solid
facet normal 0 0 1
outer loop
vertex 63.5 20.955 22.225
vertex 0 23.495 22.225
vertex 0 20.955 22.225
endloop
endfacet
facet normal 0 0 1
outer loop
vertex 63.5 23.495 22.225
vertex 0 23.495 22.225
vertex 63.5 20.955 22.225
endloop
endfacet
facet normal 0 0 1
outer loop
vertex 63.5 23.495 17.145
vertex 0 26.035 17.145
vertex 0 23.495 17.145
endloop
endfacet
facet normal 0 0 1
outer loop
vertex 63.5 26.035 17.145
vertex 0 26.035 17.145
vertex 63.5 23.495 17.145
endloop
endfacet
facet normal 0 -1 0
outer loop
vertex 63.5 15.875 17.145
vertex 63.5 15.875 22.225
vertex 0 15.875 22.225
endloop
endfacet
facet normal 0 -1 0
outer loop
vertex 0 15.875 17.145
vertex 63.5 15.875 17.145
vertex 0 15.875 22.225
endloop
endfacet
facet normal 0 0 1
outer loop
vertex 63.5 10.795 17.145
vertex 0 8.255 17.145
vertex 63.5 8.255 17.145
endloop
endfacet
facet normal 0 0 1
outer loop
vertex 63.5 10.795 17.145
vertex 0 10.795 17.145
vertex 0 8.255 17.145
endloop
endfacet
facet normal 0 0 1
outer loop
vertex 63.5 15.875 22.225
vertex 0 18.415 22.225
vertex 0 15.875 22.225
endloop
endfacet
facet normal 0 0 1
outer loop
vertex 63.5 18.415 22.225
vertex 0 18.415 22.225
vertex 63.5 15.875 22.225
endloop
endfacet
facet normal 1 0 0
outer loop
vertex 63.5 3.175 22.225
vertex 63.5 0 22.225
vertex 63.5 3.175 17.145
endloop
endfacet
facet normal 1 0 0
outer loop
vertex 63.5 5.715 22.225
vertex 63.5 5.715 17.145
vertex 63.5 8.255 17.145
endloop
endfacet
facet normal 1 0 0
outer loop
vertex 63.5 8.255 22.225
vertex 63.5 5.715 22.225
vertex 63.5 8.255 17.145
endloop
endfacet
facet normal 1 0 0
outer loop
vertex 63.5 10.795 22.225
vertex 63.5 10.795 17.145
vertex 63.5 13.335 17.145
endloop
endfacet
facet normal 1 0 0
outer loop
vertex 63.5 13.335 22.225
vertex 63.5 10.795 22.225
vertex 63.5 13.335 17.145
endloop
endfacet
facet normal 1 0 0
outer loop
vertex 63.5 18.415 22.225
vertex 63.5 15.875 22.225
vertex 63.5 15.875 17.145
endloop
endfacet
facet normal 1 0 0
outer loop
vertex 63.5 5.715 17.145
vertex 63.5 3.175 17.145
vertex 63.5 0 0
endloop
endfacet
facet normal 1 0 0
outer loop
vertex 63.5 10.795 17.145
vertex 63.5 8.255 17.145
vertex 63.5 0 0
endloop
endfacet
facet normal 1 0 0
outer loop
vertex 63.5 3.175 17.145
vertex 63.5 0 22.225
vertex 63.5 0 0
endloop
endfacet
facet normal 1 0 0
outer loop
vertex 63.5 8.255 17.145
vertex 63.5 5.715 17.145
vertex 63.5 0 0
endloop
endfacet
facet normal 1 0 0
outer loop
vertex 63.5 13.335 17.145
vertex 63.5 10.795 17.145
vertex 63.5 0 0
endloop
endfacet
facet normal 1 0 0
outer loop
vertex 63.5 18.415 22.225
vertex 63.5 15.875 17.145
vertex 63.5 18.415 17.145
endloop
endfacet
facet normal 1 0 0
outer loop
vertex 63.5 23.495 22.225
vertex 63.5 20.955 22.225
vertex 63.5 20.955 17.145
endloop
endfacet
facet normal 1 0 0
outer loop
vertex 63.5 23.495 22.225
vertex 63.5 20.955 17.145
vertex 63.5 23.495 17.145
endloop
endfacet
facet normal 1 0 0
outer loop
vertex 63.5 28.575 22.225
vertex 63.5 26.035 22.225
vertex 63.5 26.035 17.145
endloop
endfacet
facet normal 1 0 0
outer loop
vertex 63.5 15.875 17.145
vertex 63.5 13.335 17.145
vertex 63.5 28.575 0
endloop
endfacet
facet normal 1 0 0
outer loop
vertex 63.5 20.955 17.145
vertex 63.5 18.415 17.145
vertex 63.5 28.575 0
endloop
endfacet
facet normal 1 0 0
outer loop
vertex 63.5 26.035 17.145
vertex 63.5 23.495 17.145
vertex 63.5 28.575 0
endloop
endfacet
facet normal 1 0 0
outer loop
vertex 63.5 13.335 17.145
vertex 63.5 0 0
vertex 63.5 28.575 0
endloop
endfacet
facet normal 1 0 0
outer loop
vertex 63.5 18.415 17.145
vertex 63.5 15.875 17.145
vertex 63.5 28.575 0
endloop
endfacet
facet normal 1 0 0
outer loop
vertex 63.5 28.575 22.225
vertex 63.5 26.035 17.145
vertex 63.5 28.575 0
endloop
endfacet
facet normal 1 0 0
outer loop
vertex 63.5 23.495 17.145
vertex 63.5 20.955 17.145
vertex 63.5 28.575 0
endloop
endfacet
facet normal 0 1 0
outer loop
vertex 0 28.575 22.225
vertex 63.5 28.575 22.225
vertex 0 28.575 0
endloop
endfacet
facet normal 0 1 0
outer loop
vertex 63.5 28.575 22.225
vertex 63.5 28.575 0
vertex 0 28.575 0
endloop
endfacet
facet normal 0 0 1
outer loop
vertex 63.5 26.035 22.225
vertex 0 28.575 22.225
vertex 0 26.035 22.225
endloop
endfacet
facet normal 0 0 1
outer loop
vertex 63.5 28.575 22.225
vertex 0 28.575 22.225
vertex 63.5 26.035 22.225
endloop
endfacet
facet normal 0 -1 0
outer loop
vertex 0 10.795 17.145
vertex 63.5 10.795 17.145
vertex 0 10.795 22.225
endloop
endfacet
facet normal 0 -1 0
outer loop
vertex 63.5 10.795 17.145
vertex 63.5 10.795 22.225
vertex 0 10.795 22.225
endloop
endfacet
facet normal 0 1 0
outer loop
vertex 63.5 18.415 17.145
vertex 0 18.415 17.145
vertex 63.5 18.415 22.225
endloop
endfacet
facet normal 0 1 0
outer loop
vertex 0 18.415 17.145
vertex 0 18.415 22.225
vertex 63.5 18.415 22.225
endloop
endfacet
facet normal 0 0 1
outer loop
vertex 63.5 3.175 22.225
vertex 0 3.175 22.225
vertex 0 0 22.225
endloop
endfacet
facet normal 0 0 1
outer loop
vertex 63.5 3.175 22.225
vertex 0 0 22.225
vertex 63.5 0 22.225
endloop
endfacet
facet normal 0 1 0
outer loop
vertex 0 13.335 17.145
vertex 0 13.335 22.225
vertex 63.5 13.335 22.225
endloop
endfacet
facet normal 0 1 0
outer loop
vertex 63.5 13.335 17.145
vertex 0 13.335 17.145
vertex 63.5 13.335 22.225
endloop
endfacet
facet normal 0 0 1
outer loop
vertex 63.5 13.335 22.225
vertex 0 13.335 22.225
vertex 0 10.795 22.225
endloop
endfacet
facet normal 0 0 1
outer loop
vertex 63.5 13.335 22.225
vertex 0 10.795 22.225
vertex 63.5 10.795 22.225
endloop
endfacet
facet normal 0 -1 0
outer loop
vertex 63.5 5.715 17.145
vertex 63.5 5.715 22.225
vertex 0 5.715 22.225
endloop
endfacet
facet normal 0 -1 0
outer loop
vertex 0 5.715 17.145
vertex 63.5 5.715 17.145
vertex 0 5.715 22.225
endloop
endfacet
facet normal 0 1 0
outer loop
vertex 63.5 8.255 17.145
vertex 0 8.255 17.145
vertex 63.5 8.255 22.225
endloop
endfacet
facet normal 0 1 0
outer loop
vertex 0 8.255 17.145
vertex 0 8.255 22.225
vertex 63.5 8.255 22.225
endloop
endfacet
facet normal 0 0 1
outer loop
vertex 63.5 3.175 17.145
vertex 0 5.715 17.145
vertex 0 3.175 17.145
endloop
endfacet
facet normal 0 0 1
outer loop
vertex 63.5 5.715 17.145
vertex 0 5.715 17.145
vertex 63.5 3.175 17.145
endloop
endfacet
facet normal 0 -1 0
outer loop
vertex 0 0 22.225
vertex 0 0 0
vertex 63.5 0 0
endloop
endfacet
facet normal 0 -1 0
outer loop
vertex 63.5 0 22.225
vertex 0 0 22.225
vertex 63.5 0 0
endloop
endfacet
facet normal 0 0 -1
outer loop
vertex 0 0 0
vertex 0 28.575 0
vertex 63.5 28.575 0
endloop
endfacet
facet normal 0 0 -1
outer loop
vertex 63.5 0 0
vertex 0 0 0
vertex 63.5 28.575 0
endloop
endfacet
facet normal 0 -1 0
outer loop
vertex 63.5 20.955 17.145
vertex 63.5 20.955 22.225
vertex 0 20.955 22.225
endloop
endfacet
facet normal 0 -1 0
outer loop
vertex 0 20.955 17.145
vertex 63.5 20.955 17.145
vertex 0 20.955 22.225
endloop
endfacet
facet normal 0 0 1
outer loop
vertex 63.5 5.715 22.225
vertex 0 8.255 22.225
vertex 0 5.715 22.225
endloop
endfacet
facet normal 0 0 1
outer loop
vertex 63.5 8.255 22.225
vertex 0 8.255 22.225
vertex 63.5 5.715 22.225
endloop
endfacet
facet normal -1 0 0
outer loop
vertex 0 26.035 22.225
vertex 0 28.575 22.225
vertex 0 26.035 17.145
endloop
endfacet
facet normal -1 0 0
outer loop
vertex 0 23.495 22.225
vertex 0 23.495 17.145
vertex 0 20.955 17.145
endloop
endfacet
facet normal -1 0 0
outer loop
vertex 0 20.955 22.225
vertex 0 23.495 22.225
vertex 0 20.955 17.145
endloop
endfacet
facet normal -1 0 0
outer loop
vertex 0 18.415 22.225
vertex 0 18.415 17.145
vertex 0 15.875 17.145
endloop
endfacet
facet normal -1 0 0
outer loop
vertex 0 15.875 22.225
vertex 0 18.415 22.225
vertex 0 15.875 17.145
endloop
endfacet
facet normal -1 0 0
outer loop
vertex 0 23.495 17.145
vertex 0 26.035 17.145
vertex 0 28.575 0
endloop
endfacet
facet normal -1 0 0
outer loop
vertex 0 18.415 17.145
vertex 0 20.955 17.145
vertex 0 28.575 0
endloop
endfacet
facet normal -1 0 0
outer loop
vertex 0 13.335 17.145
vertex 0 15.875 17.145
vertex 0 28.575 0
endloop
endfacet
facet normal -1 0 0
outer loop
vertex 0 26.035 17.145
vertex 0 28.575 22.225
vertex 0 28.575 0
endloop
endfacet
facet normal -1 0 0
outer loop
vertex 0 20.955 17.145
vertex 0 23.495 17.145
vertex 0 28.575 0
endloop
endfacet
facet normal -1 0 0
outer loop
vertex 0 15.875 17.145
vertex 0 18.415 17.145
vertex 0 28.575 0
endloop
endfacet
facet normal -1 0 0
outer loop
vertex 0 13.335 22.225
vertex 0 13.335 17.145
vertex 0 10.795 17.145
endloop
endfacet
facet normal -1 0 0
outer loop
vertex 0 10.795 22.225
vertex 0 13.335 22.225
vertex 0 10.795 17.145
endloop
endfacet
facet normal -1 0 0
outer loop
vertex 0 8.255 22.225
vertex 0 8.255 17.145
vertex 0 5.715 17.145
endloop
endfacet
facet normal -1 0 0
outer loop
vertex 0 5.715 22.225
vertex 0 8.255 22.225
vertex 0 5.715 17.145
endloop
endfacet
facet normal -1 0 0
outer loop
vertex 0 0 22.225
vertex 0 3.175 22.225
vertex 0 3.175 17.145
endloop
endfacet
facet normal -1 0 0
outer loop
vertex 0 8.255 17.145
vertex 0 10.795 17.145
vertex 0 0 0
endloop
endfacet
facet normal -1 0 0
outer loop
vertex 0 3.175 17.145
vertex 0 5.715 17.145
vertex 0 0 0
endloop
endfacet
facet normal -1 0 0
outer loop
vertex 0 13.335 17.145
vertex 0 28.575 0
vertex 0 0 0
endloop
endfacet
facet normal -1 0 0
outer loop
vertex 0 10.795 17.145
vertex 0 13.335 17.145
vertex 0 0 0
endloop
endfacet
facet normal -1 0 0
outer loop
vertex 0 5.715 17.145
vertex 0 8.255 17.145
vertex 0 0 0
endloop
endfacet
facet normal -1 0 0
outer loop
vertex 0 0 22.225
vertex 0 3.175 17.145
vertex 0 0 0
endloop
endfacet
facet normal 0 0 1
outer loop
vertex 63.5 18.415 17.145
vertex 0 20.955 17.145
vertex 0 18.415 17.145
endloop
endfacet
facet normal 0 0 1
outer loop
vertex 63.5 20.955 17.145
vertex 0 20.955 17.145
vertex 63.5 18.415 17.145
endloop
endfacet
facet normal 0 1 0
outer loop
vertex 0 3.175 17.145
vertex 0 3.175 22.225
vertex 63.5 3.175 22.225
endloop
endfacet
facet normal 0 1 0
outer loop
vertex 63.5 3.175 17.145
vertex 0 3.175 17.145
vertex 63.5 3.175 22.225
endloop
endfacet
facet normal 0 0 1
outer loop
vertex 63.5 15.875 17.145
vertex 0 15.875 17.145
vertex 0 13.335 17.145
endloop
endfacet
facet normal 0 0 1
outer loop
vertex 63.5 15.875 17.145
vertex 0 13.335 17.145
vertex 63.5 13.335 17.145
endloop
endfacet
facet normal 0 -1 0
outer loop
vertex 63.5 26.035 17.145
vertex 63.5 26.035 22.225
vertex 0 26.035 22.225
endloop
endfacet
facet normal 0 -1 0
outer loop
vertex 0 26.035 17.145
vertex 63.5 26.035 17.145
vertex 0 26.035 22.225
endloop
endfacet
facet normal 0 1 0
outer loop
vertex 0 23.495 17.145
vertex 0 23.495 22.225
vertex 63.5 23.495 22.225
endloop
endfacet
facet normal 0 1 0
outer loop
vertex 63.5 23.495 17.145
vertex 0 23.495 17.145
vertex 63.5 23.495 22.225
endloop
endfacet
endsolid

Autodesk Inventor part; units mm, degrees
ref_plane "YZ Plane" through (0, 0, 0) normal (1, 0, 0) x (0, 1, 0)
ref_plane "XZ Plane" through (0, 0, 0) normal (0, 1, 0) x (-1, 0, 0)
ref_plane "XY Plane" through (0, 0, 0) normal (0, 0, 1) x (1, 0, 0)
sketch "Sketch1" plane through (0, 0, 0) normal (0, 0, 1) x (1, 0, 0)
  line L0 (0, 0) -> (63.5, 0)
  line L1 (63.5, 0) -> (63.5, 28.575)
  line L2 (63.5, 28.575) -> (0, 28.575)
  line L3 (0, 28.575) -> (0, 0)
  dimension "d0" = 63.5
  dimension "d1" = 28.575
extrude "Extrusion1" add sketch "Sketch1" along normal blind 22.225
sketch "Sketch2" plane through (0, 0, 22.225) normal (0, 0, 1) x (1, 0, 0)
  line L0 (63.5, 0) -> (63.5, 28.575) projected
  line L1 (0, 28.575) -> (0, 0) projected
  line L2 (63.5, 26.035) -> (0, 26.035)
  line L3 (0, 26.035) -> (0, 23.495)
  line L4 (0, 23.495) -> (63.5, 23.495)
  line L5 (63.5, 23.495) -> (63.5, 26.035)
  line L6 (63.5, 28.575) -> (0, 28.575) projected
  line L7 (63.5, 20.955) -> (0, 20.955)
  line L8 (0, 20.955) -> (0, 18.415)
  line L9 (0, 18.415) -> (63.5, 18.415)
  line L10 (63.5, 18.415) -> (63.5, 20.955)
  line L11 (63.5, 15.875) -> (0, 15.875)
  line L12 (0, 15.875) -> (0, 13.335)
  line L13 (0, 13.335) -> (63.5, 13.335)
  line L14 (63.5, 13.335) -> (63.5, 15.875)
  line L15 (63.5, 10.795) -> (0, 10.795)
  line L16 (0, 10.795) -> (0, 8.255)
  line L17 (0, 8.255) -> (63.5, 8.255)
  line L18 (63.5, 8.255) -> (63.5, 10.795)
  line L19 (63.5, 5.715) -> (0, 5.715)
  line L20 (0, 5.715) -> (0, 3.175)
  line L21 (0, 3.175) -> (63.5, 3.175)
  line L22 (63.5, 3.175) -> (63.5, 5.715)
  dimension "d4" = 2.54
  dimension "d5" = 2.54
  dimension "d8" = 5.08
extrude "Extrusion2" cut sketch "Sketch2" against normal blind 5.08 contours L21 L1 L19 L0 | L17 L1 L15 L0 | L13 L1 L11 L0 | L9 L1 L7 L0 | L4 L1 L2 L0
properties part number "Victor2"
